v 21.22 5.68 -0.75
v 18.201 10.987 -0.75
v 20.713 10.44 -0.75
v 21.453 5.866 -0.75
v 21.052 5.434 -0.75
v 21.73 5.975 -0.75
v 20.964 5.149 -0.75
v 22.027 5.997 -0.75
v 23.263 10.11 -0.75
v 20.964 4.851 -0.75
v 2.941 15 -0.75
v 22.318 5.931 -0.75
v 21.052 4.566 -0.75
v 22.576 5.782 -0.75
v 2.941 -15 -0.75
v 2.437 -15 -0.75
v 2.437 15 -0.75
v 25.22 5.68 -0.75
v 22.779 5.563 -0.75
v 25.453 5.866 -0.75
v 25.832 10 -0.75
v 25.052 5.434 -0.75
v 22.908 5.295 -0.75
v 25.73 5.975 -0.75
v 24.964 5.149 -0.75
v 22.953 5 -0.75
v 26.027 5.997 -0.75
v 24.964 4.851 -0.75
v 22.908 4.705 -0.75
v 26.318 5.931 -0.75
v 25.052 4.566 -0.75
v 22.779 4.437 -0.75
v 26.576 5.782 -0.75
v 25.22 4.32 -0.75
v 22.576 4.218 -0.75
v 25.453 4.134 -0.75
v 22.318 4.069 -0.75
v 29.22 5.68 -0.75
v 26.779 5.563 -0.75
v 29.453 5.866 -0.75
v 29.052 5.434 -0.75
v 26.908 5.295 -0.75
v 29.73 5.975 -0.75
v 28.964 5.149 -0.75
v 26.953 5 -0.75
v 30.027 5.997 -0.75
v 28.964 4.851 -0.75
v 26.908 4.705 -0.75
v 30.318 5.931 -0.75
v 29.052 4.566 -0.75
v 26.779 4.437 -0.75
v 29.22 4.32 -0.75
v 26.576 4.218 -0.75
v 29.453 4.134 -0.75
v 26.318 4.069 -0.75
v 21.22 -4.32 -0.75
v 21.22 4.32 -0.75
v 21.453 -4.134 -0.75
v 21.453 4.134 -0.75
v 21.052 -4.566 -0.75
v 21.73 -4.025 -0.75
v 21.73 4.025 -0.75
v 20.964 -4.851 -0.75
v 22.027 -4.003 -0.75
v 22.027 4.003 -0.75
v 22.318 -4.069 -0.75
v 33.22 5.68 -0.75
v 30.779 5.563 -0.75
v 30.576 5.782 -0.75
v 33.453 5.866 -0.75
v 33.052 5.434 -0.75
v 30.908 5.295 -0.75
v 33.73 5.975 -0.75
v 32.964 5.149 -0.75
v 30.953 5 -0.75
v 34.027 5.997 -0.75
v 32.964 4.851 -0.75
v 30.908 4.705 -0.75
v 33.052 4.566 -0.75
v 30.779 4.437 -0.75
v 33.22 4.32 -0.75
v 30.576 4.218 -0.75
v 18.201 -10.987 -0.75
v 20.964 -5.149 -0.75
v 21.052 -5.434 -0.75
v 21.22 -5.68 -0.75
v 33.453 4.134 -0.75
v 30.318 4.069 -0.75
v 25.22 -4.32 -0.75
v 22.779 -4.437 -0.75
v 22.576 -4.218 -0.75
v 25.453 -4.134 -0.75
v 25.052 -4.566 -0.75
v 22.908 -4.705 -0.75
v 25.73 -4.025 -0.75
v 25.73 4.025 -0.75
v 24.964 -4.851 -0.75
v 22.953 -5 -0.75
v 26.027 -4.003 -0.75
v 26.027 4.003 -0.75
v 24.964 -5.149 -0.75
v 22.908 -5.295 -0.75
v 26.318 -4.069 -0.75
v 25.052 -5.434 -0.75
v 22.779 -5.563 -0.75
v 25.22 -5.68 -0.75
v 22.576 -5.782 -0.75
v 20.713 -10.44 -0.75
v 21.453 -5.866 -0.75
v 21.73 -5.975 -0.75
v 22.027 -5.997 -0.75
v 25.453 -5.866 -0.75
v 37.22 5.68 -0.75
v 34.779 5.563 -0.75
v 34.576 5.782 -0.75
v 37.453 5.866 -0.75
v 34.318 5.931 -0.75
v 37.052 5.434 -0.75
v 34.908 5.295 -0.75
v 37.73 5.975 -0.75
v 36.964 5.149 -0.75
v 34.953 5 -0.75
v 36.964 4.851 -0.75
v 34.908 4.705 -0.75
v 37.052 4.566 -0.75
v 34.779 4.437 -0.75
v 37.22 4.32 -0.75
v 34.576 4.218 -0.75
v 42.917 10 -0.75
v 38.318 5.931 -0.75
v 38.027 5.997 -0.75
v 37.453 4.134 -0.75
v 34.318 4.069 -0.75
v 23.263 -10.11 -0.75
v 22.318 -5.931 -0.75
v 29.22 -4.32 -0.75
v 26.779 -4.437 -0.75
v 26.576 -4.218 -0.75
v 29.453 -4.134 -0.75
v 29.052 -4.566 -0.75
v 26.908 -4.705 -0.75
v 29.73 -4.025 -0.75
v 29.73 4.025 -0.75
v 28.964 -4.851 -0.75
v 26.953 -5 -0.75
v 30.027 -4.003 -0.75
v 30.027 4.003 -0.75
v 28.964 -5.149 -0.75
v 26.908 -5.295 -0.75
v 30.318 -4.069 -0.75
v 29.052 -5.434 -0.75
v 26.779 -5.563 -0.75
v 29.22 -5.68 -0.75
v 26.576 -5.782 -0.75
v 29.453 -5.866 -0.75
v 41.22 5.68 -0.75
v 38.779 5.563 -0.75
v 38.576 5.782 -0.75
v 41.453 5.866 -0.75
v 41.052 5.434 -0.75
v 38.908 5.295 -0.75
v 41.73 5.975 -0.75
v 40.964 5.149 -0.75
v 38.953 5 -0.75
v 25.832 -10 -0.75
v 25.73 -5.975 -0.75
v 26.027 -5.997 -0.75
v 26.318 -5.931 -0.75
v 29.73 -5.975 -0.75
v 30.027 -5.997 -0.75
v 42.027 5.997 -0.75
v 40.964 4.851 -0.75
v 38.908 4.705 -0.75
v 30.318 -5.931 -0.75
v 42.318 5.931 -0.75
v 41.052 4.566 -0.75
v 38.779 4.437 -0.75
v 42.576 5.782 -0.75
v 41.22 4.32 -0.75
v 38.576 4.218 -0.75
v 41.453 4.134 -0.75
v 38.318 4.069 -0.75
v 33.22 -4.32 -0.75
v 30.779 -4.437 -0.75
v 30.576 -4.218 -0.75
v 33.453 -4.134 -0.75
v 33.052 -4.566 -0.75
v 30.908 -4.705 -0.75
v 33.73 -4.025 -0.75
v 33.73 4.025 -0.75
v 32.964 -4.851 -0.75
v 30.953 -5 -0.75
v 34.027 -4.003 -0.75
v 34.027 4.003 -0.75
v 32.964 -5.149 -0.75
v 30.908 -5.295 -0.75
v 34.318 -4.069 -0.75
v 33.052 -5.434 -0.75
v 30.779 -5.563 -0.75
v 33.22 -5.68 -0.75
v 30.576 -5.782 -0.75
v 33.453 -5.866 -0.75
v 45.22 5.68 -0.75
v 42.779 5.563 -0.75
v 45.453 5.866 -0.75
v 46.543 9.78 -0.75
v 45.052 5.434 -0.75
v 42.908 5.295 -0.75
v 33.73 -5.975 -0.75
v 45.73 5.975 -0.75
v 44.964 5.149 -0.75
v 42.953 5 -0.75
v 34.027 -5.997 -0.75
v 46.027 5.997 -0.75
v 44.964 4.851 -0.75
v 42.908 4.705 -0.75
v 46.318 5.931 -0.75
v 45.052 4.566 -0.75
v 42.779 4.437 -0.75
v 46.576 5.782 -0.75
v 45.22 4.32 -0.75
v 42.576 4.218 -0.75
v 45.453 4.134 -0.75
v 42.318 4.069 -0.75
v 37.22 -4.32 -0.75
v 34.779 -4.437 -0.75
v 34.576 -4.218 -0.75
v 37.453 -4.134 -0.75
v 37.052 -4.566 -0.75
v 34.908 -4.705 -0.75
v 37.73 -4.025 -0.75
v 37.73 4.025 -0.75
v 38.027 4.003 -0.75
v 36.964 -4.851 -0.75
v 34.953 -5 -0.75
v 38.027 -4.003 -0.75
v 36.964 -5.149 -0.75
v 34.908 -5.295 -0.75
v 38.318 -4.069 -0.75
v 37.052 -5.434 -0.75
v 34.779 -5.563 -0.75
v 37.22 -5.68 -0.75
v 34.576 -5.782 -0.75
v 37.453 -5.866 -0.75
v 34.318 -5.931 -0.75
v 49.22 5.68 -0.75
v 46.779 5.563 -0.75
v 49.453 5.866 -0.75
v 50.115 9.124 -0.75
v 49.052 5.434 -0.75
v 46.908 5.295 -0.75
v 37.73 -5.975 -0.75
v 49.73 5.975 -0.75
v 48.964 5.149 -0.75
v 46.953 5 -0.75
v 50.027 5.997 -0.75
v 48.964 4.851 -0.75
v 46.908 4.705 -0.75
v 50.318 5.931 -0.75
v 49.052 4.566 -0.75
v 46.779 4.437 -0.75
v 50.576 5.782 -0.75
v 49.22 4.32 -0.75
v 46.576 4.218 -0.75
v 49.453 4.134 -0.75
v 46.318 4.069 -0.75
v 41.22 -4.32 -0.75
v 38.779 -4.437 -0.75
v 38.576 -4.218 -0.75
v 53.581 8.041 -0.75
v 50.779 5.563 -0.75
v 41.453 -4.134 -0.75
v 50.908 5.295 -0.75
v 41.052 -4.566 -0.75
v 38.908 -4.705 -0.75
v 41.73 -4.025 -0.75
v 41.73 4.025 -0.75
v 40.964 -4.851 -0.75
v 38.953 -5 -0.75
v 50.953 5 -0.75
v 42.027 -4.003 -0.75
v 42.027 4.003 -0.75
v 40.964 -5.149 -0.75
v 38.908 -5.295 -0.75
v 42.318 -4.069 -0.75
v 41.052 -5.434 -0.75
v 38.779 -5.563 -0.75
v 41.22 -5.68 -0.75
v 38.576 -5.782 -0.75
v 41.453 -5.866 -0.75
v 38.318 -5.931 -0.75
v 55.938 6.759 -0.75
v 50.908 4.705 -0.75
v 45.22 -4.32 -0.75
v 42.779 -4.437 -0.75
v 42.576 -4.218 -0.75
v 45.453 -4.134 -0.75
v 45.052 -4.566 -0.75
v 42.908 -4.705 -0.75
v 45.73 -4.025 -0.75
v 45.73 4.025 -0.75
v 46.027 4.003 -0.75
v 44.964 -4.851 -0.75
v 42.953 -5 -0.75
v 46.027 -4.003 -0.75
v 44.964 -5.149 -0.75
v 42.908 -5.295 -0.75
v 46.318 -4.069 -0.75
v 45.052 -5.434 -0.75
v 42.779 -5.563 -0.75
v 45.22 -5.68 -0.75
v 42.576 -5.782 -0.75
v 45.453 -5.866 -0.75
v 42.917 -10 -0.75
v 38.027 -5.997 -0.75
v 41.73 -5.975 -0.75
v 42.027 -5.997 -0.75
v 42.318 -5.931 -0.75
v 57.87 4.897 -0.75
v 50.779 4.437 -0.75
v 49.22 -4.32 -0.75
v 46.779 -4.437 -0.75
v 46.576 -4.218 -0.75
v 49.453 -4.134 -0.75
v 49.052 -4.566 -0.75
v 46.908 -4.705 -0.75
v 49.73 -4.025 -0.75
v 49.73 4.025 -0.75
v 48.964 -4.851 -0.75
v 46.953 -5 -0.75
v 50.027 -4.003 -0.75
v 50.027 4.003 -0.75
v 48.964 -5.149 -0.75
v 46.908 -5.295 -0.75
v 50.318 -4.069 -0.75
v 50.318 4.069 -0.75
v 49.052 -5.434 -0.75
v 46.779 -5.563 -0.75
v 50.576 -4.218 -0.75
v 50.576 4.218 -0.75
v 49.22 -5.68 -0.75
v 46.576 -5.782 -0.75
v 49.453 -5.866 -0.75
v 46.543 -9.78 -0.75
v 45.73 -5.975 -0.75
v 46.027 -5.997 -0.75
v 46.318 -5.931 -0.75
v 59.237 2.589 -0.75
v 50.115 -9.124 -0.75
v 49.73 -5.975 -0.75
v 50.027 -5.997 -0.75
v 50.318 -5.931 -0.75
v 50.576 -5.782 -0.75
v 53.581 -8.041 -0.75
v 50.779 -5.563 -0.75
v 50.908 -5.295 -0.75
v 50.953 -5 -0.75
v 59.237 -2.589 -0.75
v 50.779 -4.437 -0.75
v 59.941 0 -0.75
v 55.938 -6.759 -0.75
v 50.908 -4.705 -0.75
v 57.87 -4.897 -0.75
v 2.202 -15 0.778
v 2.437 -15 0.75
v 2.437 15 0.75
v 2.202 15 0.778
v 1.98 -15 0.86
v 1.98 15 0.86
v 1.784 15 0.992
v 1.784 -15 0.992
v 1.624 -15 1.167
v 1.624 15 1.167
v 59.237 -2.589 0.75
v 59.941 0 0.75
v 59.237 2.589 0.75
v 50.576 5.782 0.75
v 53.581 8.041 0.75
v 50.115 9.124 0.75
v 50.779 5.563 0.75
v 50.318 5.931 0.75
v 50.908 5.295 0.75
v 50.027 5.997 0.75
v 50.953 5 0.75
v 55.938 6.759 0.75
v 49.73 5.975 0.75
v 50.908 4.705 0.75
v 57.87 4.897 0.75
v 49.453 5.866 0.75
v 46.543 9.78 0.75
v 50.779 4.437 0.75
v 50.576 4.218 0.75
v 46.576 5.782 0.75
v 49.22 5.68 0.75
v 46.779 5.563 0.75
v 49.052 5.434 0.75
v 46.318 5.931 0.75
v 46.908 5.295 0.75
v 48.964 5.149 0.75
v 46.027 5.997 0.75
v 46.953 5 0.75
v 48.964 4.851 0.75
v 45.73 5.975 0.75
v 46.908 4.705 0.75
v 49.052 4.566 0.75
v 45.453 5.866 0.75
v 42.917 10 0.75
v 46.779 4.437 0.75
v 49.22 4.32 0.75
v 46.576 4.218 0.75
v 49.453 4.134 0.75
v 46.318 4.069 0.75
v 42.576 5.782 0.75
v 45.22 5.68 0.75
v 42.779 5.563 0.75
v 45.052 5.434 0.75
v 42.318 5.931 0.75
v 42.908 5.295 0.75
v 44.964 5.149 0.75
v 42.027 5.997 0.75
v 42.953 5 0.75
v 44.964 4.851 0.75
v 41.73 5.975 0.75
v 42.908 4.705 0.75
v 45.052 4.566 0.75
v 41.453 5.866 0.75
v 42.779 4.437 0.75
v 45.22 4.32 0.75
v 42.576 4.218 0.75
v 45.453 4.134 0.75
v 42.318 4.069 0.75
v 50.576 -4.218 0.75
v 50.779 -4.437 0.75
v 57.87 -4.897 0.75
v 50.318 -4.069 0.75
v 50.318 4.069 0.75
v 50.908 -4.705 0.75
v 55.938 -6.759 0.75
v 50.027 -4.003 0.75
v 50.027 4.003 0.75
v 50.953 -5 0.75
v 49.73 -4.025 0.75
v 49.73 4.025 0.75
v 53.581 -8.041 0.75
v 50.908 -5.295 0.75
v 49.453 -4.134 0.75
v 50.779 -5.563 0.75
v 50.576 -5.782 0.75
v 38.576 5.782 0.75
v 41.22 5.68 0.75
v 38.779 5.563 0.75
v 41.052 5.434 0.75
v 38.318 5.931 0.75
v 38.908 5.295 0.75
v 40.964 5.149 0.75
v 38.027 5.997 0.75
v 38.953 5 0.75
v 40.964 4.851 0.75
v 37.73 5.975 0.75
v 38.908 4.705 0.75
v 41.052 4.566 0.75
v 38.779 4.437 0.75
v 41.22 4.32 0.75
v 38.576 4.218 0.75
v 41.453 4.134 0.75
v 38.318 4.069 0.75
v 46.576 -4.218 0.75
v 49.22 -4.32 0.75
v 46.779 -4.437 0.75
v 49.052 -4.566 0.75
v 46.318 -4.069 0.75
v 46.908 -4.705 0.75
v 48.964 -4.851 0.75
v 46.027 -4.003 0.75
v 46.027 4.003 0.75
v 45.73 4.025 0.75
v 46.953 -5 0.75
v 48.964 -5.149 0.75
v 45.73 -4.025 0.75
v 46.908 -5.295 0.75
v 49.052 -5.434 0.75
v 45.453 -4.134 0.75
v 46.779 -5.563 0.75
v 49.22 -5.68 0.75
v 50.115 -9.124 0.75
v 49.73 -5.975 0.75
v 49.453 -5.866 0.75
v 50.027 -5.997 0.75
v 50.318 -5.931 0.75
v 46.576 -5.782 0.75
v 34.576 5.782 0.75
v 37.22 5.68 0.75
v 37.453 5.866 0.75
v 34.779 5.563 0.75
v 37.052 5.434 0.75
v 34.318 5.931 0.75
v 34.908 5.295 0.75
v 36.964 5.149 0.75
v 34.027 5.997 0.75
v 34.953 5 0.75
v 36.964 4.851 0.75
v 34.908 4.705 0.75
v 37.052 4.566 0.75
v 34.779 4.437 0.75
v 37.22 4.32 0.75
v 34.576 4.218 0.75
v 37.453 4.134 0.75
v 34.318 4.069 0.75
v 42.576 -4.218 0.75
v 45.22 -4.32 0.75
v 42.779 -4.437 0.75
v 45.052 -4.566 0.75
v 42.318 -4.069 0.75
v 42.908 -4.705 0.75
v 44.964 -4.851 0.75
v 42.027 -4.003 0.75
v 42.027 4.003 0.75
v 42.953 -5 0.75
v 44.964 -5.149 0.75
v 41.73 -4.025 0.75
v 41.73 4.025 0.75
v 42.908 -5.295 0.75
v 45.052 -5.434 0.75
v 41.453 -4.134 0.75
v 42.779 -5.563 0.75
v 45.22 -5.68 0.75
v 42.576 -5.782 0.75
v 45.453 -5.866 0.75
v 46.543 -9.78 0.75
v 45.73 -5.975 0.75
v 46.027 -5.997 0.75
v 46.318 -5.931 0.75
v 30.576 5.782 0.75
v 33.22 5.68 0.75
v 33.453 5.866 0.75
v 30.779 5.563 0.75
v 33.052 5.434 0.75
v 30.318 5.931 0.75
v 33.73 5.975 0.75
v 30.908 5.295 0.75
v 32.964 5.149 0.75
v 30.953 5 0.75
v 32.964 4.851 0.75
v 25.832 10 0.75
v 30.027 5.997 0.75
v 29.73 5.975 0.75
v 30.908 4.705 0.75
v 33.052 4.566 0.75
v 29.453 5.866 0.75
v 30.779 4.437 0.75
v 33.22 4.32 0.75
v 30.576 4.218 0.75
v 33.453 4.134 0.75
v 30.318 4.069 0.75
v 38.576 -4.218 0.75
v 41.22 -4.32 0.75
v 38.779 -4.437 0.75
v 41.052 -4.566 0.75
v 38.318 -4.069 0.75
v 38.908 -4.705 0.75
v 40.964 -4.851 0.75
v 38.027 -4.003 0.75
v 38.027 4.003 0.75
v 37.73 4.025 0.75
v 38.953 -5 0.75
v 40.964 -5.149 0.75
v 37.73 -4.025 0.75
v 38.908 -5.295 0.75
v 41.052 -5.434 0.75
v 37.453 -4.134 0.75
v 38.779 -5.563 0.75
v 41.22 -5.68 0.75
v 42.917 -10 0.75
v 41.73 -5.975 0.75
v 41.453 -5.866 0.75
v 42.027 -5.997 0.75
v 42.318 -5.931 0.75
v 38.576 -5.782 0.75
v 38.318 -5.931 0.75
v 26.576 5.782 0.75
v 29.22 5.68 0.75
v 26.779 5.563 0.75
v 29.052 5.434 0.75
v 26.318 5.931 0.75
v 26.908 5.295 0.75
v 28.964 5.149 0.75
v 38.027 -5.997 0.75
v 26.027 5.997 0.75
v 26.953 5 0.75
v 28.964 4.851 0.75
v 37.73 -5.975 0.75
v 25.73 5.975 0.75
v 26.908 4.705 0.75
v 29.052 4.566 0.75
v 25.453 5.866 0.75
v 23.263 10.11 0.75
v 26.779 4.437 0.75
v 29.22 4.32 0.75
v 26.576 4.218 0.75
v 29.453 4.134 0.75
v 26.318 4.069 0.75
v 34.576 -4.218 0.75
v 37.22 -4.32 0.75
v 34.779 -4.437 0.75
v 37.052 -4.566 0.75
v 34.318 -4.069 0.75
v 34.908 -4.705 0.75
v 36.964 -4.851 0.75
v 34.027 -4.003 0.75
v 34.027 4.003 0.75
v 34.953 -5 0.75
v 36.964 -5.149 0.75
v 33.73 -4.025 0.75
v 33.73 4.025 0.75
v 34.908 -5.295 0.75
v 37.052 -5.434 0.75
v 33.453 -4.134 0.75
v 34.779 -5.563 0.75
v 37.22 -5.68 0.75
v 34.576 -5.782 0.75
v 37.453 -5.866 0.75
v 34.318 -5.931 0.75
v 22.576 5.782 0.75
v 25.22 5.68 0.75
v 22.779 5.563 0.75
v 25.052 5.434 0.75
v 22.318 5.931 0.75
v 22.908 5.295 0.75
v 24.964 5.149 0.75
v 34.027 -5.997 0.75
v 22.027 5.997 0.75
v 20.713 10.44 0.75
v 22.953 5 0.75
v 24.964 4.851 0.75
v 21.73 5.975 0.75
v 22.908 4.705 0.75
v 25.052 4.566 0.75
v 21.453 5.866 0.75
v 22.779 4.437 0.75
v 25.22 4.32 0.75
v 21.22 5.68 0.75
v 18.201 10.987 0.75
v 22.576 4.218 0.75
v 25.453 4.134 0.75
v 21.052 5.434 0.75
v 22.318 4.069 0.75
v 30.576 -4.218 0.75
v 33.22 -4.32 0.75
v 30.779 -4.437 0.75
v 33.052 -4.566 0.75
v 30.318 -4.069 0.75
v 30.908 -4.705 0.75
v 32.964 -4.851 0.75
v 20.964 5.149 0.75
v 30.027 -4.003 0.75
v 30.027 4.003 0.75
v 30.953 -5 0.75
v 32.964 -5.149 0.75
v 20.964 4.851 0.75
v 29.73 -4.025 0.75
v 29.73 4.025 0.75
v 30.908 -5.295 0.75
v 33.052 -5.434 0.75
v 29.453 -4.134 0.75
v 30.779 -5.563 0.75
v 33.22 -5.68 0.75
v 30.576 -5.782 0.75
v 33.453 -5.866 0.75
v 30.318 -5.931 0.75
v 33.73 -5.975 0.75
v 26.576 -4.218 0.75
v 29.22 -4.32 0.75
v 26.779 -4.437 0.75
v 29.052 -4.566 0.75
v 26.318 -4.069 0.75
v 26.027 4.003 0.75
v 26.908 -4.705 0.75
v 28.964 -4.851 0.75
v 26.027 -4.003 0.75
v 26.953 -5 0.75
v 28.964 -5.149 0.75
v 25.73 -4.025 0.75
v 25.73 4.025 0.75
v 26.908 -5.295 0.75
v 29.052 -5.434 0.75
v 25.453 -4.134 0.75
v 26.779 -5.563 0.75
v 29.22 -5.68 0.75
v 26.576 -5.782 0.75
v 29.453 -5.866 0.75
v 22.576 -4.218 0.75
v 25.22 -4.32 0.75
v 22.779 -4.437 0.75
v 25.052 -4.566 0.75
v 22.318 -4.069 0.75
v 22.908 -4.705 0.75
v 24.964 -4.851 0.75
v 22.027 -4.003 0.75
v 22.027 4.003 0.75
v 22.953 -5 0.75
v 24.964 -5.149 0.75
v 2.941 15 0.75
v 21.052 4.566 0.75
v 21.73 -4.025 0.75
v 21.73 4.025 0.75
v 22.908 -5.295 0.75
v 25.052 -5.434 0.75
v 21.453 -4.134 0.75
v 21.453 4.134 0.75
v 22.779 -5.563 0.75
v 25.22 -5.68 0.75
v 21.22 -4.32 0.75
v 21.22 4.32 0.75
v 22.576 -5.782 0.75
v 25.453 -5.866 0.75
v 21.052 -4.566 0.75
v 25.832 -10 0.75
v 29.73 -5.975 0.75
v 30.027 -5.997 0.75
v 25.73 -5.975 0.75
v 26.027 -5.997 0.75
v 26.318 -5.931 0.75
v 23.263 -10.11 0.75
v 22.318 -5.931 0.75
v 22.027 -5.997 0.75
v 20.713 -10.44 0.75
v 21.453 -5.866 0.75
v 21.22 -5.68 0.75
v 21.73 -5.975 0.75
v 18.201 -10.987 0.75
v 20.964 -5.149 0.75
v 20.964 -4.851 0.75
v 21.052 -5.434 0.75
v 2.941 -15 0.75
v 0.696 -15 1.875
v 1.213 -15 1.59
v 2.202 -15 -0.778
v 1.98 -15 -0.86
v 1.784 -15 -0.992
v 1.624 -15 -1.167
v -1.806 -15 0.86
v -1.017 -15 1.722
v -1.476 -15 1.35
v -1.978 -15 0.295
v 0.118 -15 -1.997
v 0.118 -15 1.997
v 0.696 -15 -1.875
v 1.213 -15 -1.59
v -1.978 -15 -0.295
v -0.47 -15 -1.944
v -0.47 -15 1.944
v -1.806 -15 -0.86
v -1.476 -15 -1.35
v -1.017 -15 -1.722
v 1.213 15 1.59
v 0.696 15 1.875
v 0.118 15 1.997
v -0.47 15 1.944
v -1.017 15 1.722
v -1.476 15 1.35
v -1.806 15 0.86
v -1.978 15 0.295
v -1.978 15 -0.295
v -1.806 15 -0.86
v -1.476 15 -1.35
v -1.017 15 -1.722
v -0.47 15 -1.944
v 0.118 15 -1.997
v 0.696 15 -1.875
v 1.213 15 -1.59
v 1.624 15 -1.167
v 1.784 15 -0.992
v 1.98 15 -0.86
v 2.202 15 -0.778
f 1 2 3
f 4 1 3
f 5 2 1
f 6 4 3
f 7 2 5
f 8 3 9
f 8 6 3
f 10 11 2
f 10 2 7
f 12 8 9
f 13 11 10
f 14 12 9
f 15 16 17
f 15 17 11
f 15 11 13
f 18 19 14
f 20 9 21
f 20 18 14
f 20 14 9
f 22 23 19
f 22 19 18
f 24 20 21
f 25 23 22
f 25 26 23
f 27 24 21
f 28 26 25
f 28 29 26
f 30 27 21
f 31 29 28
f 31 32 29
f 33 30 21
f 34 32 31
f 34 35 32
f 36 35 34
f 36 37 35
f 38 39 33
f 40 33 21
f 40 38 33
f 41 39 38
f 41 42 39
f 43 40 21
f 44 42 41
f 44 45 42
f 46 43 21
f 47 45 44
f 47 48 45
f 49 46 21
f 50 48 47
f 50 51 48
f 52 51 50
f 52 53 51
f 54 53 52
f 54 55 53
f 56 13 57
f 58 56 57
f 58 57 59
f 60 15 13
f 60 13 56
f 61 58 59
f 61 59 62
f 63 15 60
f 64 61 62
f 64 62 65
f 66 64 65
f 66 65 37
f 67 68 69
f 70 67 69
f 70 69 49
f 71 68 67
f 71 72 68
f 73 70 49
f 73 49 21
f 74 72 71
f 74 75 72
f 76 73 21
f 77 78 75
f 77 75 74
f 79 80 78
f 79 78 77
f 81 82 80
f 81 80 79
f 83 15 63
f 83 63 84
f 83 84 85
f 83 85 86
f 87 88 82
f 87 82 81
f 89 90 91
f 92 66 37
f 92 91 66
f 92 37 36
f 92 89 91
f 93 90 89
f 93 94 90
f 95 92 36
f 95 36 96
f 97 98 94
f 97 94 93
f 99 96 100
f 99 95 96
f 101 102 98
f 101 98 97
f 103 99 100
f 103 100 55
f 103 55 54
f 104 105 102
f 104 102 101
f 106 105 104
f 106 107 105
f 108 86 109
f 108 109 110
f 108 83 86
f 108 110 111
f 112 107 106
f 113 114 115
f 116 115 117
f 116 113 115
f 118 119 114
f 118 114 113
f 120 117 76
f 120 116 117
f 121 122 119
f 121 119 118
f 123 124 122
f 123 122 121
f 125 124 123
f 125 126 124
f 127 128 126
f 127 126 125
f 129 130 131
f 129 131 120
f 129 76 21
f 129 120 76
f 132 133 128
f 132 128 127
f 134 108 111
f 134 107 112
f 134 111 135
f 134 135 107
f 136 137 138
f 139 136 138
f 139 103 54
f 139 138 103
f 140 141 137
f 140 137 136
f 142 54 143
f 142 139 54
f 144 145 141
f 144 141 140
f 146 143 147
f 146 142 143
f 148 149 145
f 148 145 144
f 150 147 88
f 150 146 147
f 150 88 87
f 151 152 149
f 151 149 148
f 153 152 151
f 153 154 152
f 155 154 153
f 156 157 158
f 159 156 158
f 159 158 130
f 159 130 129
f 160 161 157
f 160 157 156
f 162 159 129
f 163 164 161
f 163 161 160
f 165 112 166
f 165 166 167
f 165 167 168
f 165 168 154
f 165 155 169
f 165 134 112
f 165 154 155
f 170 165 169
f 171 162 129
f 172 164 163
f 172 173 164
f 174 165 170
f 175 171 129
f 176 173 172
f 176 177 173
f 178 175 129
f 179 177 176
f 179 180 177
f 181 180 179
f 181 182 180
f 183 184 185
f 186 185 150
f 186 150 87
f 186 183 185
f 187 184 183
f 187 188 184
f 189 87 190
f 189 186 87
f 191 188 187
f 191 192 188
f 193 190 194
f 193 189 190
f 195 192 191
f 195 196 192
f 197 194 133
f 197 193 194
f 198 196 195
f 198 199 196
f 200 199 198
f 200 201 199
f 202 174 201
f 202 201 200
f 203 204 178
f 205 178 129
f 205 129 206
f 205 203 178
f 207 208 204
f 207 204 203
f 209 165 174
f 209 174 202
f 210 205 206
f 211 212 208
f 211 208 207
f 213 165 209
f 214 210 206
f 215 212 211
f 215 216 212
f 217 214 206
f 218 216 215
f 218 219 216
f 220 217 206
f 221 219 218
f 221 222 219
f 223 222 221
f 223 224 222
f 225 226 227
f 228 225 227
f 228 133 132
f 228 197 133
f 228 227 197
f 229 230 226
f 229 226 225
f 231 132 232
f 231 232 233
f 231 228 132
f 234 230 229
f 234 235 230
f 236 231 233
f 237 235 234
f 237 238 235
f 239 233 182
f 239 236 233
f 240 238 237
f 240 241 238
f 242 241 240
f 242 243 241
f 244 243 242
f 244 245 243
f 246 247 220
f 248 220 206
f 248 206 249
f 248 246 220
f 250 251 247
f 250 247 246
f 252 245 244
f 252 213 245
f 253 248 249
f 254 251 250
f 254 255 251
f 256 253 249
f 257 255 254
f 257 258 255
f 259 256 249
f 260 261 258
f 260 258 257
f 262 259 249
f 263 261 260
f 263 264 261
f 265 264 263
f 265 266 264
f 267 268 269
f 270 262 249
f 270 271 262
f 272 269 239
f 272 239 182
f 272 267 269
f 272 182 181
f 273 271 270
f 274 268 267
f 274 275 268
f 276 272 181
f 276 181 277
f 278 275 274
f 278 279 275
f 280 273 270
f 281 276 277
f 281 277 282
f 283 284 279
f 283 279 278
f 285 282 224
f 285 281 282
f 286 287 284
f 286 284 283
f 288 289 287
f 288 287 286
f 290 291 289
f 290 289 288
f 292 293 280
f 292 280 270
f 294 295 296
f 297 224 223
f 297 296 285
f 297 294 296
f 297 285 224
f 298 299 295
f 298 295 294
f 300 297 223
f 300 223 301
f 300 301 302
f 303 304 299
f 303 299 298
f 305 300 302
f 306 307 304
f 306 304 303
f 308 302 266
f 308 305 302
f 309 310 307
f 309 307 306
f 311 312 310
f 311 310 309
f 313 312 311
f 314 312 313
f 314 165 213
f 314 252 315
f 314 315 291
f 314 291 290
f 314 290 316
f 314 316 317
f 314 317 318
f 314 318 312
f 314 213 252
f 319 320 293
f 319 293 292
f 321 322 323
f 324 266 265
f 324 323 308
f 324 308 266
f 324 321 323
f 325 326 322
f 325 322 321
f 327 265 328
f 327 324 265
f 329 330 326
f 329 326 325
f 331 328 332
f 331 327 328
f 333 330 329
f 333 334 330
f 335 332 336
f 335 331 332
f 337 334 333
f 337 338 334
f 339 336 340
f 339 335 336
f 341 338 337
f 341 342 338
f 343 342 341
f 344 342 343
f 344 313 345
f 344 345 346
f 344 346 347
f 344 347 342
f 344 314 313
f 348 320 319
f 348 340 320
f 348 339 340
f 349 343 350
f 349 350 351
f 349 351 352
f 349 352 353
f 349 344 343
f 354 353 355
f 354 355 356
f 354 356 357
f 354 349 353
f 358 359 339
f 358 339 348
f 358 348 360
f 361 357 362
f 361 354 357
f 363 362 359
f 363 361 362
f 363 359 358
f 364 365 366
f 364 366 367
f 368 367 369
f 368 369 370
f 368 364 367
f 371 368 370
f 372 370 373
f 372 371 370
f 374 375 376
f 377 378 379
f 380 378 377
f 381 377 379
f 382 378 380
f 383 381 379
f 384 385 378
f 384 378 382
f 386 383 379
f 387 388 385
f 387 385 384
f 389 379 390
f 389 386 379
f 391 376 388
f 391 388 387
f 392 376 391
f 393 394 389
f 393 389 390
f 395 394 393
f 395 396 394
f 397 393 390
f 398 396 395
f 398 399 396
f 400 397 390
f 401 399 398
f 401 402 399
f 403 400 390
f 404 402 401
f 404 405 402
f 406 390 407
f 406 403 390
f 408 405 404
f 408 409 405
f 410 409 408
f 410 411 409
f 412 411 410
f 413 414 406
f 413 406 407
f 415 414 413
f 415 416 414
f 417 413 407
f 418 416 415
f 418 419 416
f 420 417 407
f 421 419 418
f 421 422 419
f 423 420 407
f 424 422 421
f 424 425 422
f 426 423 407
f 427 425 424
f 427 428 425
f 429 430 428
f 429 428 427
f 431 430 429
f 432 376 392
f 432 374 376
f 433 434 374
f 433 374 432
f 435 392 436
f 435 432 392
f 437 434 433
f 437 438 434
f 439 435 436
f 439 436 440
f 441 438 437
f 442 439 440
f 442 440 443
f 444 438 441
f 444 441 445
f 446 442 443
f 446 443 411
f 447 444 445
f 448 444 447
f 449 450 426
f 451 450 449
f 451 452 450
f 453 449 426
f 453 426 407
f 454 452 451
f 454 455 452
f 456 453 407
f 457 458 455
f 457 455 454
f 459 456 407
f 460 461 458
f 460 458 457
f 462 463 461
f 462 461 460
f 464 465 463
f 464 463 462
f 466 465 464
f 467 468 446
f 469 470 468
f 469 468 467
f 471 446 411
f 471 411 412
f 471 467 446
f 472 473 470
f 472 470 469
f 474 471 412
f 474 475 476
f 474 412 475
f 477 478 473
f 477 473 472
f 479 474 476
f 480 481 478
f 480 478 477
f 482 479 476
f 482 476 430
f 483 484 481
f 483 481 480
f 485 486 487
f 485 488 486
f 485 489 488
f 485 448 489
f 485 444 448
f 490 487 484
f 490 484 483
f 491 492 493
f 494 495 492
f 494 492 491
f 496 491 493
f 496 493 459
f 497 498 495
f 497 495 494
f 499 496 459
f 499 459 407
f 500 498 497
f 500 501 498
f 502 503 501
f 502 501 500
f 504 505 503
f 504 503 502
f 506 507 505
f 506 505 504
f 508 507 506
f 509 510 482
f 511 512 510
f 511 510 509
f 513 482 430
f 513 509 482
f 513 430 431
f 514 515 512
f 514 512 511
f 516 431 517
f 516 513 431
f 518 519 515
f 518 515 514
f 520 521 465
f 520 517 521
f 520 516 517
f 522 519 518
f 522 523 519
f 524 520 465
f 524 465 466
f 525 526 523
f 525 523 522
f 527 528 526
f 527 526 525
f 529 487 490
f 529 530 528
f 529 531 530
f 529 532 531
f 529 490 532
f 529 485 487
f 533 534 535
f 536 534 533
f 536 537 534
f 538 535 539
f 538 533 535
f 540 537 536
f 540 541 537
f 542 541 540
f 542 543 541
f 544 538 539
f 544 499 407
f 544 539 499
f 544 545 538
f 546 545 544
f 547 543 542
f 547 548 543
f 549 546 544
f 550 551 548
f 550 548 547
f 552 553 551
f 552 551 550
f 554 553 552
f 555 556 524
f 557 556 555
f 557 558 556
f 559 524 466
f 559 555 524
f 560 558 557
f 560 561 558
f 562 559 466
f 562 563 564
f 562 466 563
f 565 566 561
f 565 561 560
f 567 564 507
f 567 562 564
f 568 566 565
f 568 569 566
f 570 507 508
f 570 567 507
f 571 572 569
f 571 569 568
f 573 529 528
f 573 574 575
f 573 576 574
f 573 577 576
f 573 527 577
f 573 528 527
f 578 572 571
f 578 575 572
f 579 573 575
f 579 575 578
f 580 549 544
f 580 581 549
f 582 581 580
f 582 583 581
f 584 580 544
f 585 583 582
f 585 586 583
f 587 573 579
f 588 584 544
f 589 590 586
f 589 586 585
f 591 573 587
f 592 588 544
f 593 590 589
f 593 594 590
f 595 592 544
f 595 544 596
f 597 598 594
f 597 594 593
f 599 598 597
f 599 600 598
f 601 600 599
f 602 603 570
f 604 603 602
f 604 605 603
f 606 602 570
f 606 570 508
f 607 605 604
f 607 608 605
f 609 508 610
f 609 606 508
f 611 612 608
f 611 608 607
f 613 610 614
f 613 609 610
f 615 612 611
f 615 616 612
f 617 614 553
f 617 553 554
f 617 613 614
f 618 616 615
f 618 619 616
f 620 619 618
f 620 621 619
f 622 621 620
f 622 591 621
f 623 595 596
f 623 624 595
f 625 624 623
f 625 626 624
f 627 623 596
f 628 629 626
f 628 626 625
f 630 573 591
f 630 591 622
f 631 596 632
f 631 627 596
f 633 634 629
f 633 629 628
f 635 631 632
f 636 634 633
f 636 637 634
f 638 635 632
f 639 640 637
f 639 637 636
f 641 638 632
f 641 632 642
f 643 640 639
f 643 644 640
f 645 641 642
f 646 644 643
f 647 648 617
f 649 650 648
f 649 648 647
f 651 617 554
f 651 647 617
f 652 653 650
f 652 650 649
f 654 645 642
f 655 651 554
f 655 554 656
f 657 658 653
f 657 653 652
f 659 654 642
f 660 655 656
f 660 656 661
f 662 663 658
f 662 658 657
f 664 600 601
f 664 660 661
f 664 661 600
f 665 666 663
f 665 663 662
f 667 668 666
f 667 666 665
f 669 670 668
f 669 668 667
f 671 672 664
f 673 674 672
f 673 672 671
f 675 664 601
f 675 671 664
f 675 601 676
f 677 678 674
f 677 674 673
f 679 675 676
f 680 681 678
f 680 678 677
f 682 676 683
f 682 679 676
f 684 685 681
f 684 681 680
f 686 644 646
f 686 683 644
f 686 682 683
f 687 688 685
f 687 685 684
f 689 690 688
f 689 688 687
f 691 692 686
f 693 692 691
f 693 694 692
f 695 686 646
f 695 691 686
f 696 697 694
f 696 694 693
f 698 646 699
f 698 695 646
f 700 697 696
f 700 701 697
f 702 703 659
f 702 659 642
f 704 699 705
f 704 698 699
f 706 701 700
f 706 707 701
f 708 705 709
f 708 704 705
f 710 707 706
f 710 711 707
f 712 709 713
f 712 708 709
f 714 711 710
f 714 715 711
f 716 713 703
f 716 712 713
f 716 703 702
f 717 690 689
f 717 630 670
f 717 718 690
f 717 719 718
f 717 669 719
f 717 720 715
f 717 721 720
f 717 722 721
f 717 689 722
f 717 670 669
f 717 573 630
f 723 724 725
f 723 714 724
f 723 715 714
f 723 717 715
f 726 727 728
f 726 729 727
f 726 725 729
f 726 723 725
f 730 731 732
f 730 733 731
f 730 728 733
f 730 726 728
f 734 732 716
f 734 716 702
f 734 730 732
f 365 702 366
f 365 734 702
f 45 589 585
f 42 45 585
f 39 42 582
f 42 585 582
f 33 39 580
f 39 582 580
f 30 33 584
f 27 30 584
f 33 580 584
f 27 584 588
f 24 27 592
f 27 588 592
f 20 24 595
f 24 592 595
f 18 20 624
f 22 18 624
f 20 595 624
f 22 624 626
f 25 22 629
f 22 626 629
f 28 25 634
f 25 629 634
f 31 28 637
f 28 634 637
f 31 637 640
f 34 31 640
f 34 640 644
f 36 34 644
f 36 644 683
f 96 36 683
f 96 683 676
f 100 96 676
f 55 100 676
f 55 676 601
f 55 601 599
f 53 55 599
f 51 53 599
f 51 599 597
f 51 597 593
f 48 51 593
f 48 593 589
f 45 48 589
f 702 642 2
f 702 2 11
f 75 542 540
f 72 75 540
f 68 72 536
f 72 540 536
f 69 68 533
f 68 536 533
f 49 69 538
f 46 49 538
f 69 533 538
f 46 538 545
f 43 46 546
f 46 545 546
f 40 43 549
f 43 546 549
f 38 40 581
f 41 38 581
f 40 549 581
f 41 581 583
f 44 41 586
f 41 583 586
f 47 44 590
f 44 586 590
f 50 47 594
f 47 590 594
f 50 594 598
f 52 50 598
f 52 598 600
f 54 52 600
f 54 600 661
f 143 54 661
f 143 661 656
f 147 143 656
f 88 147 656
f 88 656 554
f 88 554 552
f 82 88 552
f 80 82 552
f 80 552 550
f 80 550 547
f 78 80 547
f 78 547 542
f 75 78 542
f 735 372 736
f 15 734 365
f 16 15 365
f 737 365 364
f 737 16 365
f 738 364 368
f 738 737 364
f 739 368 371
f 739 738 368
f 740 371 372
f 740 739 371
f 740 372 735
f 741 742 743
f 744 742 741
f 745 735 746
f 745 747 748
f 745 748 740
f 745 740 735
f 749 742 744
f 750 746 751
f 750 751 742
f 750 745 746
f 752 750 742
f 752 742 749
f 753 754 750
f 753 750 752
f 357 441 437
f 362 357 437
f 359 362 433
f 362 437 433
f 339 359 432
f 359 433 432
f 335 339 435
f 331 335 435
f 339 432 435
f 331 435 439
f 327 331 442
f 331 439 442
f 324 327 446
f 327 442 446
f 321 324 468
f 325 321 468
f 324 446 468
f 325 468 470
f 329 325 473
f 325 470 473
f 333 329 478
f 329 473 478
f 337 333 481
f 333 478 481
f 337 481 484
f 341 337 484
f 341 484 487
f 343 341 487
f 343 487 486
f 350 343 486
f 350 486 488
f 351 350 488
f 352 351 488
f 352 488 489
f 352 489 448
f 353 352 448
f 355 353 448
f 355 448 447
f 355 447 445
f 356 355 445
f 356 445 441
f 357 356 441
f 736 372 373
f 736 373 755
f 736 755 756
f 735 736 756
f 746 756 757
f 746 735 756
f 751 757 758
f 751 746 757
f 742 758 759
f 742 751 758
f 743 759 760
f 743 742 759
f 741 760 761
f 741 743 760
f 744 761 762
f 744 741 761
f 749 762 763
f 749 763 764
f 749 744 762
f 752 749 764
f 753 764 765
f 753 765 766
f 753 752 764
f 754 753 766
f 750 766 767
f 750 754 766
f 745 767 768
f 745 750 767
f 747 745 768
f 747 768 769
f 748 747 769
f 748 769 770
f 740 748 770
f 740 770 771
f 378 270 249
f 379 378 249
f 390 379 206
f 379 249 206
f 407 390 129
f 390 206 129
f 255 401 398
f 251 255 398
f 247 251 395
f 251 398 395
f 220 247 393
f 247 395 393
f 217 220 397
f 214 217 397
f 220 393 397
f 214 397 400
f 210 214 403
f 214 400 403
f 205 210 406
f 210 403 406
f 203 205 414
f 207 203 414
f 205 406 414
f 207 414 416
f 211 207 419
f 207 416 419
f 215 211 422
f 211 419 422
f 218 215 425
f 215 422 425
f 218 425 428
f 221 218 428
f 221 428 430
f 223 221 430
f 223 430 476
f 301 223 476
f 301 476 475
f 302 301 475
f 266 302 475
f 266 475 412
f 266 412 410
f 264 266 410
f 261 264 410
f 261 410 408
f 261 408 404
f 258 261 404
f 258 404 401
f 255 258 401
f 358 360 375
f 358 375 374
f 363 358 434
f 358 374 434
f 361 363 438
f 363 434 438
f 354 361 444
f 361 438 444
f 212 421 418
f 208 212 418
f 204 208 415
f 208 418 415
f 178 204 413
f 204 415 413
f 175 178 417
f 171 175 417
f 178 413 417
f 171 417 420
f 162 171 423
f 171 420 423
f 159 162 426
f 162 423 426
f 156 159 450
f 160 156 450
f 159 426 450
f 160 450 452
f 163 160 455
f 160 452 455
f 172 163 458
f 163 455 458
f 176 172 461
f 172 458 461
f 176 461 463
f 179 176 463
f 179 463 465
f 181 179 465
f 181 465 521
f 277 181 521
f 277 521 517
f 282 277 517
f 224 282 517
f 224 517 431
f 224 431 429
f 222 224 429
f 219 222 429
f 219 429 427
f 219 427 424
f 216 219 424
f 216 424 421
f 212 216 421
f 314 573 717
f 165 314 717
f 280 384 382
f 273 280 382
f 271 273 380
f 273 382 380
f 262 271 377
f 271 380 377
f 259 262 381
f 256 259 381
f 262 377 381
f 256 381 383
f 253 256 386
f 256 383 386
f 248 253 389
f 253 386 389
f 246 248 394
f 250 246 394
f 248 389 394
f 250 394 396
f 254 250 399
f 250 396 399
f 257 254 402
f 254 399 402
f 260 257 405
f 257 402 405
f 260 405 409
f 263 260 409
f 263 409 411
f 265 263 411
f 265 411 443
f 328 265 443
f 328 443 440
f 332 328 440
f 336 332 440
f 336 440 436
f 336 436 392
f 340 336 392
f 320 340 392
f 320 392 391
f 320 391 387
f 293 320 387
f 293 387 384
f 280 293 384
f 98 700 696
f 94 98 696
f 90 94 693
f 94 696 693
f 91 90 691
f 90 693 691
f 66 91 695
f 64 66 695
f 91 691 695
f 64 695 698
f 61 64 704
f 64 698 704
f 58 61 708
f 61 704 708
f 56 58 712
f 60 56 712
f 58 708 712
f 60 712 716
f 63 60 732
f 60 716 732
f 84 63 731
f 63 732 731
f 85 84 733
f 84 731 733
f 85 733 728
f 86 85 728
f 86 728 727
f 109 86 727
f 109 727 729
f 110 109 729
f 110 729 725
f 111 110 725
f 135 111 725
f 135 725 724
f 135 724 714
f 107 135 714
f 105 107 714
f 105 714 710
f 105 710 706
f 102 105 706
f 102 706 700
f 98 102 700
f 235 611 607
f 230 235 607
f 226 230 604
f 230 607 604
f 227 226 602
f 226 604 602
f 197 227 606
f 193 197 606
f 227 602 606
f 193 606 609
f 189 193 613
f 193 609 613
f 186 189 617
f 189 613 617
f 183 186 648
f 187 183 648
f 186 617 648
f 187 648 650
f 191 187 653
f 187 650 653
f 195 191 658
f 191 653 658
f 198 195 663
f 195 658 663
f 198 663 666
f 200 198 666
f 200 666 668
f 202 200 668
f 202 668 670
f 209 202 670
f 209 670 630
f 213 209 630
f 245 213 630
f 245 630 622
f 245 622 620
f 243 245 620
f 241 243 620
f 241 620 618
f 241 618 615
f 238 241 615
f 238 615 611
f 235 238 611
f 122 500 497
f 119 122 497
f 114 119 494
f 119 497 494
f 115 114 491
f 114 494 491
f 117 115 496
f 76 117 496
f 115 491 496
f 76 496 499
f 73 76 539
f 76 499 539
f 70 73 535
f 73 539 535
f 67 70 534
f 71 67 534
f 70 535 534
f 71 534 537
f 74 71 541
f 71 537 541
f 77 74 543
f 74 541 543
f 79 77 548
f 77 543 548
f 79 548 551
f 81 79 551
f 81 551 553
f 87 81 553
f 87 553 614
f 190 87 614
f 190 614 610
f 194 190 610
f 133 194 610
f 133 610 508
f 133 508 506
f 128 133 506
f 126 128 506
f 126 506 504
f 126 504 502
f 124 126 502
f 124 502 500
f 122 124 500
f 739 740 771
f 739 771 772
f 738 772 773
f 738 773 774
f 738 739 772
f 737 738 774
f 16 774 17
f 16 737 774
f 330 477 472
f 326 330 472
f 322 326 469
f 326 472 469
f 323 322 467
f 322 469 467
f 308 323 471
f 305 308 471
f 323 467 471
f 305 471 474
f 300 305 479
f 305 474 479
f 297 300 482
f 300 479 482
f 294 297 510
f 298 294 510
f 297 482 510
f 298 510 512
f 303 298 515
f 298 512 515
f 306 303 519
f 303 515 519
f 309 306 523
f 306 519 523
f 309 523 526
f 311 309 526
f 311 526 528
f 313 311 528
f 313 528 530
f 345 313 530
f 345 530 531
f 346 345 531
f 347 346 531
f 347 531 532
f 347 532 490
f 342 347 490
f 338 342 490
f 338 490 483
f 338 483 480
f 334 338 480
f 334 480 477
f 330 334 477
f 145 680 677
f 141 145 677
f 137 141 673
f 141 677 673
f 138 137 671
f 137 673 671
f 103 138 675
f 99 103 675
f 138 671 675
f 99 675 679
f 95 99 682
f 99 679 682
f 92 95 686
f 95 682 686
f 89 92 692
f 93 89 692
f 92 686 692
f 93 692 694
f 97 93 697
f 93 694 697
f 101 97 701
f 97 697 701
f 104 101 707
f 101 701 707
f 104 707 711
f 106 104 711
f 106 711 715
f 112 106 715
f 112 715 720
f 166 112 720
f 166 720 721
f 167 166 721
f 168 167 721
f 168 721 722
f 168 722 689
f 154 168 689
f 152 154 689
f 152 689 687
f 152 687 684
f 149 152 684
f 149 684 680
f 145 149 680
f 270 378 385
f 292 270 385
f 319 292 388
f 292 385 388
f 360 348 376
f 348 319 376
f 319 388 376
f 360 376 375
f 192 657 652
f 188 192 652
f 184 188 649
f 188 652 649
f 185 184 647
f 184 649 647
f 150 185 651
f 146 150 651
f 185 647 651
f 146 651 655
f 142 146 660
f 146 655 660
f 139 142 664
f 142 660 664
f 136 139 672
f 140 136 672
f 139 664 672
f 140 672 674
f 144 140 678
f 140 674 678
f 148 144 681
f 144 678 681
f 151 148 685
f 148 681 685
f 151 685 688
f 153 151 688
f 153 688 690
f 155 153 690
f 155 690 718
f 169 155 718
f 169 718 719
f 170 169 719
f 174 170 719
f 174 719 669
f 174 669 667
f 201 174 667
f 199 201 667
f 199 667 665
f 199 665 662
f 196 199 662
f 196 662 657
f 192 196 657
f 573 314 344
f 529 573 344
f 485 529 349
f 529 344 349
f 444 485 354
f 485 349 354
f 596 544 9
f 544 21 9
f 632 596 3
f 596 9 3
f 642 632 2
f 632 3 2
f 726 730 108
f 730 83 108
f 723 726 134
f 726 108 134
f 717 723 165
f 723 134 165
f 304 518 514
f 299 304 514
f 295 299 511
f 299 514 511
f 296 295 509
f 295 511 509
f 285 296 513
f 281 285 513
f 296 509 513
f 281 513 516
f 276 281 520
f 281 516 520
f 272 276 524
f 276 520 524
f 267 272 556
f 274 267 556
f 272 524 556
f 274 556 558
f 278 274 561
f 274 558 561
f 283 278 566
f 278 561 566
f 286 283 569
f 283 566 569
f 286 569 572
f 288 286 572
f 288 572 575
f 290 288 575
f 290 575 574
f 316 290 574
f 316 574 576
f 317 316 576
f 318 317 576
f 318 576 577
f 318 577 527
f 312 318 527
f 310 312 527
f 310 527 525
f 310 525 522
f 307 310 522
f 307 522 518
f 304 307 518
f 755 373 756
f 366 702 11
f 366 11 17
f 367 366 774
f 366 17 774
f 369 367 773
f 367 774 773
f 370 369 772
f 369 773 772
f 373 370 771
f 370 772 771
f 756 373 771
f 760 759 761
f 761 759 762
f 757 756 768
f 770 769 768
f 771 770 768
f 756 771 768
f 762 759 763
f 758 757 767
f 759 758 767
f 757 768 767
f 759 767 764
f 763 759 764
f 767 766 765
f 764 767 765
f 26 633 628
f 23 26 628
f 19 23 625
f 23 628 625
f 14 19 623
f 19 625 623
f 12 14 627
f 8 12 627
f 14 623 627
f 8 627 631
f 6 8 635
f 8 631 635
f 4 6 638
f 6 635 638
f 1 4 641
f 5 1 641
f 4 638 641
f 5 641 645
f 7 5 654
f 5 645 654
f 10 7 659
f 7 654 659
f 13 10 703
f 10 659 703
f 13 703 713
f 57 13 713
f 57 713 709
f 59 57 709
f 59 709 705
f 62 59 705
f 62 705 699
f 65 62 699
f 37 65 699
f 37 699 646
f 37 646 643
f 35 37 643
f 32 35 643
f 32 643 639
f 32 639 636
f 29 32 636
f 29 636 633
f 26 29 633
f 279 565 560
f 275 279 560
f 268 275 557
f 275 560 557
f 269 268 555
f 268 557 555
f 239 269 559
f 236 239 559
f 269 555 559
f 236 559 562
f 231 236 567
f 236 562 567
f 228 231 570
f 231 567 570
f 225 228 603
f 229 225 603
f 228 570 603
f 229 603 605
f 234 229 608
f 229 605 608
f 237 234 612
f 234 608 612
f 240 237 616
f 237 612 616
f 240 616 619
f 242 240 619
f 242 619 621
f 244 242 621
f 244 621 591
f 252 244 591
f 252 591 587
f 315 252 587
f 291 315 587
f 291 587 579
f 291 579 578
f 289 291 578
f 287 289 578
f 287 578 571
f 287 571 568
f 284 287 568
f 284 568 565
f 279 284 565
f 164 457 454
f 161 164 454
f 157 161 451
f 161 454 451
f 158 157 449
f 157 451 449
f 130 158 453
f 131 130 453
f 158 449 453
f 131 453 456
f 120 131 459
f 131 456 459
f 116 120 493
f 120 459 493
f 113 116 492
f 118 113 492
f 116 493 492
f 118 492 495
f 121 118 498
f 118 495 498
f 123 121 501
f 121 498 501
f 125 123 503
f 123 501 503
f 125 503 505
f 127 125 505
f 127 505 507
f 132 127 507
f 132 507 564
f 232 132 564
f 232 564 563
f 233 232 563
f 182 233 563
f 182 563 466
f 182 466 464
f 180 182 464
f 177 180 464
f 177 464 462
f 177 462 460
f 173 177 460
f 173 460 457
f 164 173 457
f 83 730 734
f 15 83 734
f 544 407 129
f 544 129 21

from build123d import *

# Parameters (mm, degrees)
BOSS_EXTRUDE1_DEPTH      = 15
BOSS_EXTRUDE1_DEPTH_BACK = 15
SKETCH2_R                = 1
CUT_EXTRUDE1_DEPTH       = 62.933569598
FILLET1_R                = 30
FILLET2_R                = 10


with BuildPart() as part:
    # Sketch1 → Boss-Extrude1 (new, two sides: drawn at the far end of the back side and taken through both)
    with BuildSketch(Plane(origin=(0, 0, 0), x_dir=(1, 0, 0), z_dir=(0, 1, 0)).offset(-BOSS_EXTRUDE1_DEPTH_BACK)):
        with BuildLine():
            Line((2.436698586, 0.75), (60.026698586, 0.75))
            Line((60.026698586, 0.75), (60.026698586, -0.75))
            Line((60.026698586, -0.75), (2.436698586, -0.75))
            ThreePointArc((2.436698586, -0.75), (1.980263122, -0.860243479), (1.624465724, -1.166666667))
            ThreePointArc((1.624465724, -1.166666667), (-2, 0), (1.624465724, 1.166666667))
            ThreePointArc((1.624465724, 1.166666667), (1.980263122, 0.860243479), (2.436698586, 0.75))
        make_face()
    extrude(amount=BOSS_EXTRUDE1_DEPTH + BOSS_EXTRUDE1_DEPTH_BACK)

    # Sketch2 → Cut-Extrude1 (cut, through all)
    with BuildSketch(Plane.XY.offset(0.75)):
        with Locations((49.952698586, 5)):
            Circle(SKETCH2_R)
        with Locations((45.952698586, 5)):
            Circle(SKETCH2_R)
        with Locations((41.952698586, 5)):
            Circle(SKETCH2_R)
        with Locations((37.952698586, 5)):
            Circle(SKETCH2_R)
        with Locations((33.952698586, 5)):
            Circle(SKETCH2_R)
        with Locations((29.952698586, 5)):
            Circle(SKETCH2_R)
        with Locations((25.952698586, 5)):
            Circle(SKETCH2_R)
        with Locations((21.952698586, 5)):
            Circle(SKETCH2_R)
        with Locations((45.952698586, -5)):
            Circle(SKETCH2_R)
        with Locations((41.952698586, -5)):
            Circle(SKETCH2_R)
        with Locations((37.952698586, -5)):
            Circle(SKETCH2_R)
        with Locations((33.952698586, -5)):
            Circle(SKETCH2_R)
        with Locations((29.952698586, -5)):
            Circle(SKETCH2_R)
        with Locations((25.952698586, -5)):
            Circle(SKETCH2_R)
        with Locations((21.952698586, -5)):
            Circle(SKETCH2_R)
        with Locations((49.952698586, -5)):
            Circle(SKETCH2_R)
        Polygon((49.952698586, 10), (21.952698586, 10), (2.940698586, 15), (60.026698586, 15), (60.026698586, 5), align=None)
        Polygon((49.952698586, -10), (21.952698586, -10), (2.940698586, -15), (60.026698586, -15), (60.026698586, -5), align=None)
    extrude(amount=-CUT_EXTRUDE1_DEPTH, mode=Mode.SUBTRACT)

    # Fillet1
    fillet1_edges = [part.edges().sort_by_distance(p)[0] for p in [
        (49.952698586, 10, 0),
        (21.952698586, 10, 0),
        (49.952698586, -10, 0),
        (21.952698586, -10, 0),
    ]]
    fillet(fillet1_edges, radius=FILLET1_R)

    # Fillet2
    # the kernel refuses this fillet: 10 mm, written as the material it takes off along each edge
    with BuildSketch(Plane(origin=(60.026698586, -5, 18.566207641), x_dir=(-0.9044112472912746, -0.4266618049146664, 0), z_dir=(0, 0, -1))) as fillet2_piece_1:
        with BuildLine():
            CenterArc((6.353468821, 9.970077682), FILLET2_R, 205.255895662, 69.177572528)
            Line((-2.690643652, 5.703459633), (-3.595054899, 5.276797828))
            Line((-3.595054899, 5.276797828), (-0.904411247, -0.426661805))
            Line((-0.904411247, -0.426661805), (-0.019905188, -0.999801872))
            ThreePointArc((-0.019905188, -0.999801872), (4.190379521, -1.083624989), (7.20378448, -0.997007768))
            Line((7.20378448, -0.997007768), (7.126483056, 0))
        make_face()
    extrude(amount=37.132415281, mode=Mode.SUBTRACT)
    with BuildSketch(Plane(origin=(60.026698586, 5, 18.566207641), x_dir=(0, -1, 0), z_dir=(0, 0, -1))) as fillet2_piece_2:
        with BuildLine():
            CenterArc((6.306267918, 10), FILLET2_R, 200.822427472, 69.177572528)
            Line((-3.040598123, 6.44527143), (-3.975284728, 6.089798573))
            ThreePointArc((-3.975284728, 6.089798573), (-2.767917517, 3.327484976), (-0.895739275, -0.444579747))
            Line((-0.895739275, -0.444579747), (0, -1))
            Line((0, -1), (6.306267918, -1))
            Line((6.306267918, -1), (6.306267918, 0))
        make_face()
    extrude(amount=37.132415281, mode=Mode.SUBTRACT)


solid = part.part
